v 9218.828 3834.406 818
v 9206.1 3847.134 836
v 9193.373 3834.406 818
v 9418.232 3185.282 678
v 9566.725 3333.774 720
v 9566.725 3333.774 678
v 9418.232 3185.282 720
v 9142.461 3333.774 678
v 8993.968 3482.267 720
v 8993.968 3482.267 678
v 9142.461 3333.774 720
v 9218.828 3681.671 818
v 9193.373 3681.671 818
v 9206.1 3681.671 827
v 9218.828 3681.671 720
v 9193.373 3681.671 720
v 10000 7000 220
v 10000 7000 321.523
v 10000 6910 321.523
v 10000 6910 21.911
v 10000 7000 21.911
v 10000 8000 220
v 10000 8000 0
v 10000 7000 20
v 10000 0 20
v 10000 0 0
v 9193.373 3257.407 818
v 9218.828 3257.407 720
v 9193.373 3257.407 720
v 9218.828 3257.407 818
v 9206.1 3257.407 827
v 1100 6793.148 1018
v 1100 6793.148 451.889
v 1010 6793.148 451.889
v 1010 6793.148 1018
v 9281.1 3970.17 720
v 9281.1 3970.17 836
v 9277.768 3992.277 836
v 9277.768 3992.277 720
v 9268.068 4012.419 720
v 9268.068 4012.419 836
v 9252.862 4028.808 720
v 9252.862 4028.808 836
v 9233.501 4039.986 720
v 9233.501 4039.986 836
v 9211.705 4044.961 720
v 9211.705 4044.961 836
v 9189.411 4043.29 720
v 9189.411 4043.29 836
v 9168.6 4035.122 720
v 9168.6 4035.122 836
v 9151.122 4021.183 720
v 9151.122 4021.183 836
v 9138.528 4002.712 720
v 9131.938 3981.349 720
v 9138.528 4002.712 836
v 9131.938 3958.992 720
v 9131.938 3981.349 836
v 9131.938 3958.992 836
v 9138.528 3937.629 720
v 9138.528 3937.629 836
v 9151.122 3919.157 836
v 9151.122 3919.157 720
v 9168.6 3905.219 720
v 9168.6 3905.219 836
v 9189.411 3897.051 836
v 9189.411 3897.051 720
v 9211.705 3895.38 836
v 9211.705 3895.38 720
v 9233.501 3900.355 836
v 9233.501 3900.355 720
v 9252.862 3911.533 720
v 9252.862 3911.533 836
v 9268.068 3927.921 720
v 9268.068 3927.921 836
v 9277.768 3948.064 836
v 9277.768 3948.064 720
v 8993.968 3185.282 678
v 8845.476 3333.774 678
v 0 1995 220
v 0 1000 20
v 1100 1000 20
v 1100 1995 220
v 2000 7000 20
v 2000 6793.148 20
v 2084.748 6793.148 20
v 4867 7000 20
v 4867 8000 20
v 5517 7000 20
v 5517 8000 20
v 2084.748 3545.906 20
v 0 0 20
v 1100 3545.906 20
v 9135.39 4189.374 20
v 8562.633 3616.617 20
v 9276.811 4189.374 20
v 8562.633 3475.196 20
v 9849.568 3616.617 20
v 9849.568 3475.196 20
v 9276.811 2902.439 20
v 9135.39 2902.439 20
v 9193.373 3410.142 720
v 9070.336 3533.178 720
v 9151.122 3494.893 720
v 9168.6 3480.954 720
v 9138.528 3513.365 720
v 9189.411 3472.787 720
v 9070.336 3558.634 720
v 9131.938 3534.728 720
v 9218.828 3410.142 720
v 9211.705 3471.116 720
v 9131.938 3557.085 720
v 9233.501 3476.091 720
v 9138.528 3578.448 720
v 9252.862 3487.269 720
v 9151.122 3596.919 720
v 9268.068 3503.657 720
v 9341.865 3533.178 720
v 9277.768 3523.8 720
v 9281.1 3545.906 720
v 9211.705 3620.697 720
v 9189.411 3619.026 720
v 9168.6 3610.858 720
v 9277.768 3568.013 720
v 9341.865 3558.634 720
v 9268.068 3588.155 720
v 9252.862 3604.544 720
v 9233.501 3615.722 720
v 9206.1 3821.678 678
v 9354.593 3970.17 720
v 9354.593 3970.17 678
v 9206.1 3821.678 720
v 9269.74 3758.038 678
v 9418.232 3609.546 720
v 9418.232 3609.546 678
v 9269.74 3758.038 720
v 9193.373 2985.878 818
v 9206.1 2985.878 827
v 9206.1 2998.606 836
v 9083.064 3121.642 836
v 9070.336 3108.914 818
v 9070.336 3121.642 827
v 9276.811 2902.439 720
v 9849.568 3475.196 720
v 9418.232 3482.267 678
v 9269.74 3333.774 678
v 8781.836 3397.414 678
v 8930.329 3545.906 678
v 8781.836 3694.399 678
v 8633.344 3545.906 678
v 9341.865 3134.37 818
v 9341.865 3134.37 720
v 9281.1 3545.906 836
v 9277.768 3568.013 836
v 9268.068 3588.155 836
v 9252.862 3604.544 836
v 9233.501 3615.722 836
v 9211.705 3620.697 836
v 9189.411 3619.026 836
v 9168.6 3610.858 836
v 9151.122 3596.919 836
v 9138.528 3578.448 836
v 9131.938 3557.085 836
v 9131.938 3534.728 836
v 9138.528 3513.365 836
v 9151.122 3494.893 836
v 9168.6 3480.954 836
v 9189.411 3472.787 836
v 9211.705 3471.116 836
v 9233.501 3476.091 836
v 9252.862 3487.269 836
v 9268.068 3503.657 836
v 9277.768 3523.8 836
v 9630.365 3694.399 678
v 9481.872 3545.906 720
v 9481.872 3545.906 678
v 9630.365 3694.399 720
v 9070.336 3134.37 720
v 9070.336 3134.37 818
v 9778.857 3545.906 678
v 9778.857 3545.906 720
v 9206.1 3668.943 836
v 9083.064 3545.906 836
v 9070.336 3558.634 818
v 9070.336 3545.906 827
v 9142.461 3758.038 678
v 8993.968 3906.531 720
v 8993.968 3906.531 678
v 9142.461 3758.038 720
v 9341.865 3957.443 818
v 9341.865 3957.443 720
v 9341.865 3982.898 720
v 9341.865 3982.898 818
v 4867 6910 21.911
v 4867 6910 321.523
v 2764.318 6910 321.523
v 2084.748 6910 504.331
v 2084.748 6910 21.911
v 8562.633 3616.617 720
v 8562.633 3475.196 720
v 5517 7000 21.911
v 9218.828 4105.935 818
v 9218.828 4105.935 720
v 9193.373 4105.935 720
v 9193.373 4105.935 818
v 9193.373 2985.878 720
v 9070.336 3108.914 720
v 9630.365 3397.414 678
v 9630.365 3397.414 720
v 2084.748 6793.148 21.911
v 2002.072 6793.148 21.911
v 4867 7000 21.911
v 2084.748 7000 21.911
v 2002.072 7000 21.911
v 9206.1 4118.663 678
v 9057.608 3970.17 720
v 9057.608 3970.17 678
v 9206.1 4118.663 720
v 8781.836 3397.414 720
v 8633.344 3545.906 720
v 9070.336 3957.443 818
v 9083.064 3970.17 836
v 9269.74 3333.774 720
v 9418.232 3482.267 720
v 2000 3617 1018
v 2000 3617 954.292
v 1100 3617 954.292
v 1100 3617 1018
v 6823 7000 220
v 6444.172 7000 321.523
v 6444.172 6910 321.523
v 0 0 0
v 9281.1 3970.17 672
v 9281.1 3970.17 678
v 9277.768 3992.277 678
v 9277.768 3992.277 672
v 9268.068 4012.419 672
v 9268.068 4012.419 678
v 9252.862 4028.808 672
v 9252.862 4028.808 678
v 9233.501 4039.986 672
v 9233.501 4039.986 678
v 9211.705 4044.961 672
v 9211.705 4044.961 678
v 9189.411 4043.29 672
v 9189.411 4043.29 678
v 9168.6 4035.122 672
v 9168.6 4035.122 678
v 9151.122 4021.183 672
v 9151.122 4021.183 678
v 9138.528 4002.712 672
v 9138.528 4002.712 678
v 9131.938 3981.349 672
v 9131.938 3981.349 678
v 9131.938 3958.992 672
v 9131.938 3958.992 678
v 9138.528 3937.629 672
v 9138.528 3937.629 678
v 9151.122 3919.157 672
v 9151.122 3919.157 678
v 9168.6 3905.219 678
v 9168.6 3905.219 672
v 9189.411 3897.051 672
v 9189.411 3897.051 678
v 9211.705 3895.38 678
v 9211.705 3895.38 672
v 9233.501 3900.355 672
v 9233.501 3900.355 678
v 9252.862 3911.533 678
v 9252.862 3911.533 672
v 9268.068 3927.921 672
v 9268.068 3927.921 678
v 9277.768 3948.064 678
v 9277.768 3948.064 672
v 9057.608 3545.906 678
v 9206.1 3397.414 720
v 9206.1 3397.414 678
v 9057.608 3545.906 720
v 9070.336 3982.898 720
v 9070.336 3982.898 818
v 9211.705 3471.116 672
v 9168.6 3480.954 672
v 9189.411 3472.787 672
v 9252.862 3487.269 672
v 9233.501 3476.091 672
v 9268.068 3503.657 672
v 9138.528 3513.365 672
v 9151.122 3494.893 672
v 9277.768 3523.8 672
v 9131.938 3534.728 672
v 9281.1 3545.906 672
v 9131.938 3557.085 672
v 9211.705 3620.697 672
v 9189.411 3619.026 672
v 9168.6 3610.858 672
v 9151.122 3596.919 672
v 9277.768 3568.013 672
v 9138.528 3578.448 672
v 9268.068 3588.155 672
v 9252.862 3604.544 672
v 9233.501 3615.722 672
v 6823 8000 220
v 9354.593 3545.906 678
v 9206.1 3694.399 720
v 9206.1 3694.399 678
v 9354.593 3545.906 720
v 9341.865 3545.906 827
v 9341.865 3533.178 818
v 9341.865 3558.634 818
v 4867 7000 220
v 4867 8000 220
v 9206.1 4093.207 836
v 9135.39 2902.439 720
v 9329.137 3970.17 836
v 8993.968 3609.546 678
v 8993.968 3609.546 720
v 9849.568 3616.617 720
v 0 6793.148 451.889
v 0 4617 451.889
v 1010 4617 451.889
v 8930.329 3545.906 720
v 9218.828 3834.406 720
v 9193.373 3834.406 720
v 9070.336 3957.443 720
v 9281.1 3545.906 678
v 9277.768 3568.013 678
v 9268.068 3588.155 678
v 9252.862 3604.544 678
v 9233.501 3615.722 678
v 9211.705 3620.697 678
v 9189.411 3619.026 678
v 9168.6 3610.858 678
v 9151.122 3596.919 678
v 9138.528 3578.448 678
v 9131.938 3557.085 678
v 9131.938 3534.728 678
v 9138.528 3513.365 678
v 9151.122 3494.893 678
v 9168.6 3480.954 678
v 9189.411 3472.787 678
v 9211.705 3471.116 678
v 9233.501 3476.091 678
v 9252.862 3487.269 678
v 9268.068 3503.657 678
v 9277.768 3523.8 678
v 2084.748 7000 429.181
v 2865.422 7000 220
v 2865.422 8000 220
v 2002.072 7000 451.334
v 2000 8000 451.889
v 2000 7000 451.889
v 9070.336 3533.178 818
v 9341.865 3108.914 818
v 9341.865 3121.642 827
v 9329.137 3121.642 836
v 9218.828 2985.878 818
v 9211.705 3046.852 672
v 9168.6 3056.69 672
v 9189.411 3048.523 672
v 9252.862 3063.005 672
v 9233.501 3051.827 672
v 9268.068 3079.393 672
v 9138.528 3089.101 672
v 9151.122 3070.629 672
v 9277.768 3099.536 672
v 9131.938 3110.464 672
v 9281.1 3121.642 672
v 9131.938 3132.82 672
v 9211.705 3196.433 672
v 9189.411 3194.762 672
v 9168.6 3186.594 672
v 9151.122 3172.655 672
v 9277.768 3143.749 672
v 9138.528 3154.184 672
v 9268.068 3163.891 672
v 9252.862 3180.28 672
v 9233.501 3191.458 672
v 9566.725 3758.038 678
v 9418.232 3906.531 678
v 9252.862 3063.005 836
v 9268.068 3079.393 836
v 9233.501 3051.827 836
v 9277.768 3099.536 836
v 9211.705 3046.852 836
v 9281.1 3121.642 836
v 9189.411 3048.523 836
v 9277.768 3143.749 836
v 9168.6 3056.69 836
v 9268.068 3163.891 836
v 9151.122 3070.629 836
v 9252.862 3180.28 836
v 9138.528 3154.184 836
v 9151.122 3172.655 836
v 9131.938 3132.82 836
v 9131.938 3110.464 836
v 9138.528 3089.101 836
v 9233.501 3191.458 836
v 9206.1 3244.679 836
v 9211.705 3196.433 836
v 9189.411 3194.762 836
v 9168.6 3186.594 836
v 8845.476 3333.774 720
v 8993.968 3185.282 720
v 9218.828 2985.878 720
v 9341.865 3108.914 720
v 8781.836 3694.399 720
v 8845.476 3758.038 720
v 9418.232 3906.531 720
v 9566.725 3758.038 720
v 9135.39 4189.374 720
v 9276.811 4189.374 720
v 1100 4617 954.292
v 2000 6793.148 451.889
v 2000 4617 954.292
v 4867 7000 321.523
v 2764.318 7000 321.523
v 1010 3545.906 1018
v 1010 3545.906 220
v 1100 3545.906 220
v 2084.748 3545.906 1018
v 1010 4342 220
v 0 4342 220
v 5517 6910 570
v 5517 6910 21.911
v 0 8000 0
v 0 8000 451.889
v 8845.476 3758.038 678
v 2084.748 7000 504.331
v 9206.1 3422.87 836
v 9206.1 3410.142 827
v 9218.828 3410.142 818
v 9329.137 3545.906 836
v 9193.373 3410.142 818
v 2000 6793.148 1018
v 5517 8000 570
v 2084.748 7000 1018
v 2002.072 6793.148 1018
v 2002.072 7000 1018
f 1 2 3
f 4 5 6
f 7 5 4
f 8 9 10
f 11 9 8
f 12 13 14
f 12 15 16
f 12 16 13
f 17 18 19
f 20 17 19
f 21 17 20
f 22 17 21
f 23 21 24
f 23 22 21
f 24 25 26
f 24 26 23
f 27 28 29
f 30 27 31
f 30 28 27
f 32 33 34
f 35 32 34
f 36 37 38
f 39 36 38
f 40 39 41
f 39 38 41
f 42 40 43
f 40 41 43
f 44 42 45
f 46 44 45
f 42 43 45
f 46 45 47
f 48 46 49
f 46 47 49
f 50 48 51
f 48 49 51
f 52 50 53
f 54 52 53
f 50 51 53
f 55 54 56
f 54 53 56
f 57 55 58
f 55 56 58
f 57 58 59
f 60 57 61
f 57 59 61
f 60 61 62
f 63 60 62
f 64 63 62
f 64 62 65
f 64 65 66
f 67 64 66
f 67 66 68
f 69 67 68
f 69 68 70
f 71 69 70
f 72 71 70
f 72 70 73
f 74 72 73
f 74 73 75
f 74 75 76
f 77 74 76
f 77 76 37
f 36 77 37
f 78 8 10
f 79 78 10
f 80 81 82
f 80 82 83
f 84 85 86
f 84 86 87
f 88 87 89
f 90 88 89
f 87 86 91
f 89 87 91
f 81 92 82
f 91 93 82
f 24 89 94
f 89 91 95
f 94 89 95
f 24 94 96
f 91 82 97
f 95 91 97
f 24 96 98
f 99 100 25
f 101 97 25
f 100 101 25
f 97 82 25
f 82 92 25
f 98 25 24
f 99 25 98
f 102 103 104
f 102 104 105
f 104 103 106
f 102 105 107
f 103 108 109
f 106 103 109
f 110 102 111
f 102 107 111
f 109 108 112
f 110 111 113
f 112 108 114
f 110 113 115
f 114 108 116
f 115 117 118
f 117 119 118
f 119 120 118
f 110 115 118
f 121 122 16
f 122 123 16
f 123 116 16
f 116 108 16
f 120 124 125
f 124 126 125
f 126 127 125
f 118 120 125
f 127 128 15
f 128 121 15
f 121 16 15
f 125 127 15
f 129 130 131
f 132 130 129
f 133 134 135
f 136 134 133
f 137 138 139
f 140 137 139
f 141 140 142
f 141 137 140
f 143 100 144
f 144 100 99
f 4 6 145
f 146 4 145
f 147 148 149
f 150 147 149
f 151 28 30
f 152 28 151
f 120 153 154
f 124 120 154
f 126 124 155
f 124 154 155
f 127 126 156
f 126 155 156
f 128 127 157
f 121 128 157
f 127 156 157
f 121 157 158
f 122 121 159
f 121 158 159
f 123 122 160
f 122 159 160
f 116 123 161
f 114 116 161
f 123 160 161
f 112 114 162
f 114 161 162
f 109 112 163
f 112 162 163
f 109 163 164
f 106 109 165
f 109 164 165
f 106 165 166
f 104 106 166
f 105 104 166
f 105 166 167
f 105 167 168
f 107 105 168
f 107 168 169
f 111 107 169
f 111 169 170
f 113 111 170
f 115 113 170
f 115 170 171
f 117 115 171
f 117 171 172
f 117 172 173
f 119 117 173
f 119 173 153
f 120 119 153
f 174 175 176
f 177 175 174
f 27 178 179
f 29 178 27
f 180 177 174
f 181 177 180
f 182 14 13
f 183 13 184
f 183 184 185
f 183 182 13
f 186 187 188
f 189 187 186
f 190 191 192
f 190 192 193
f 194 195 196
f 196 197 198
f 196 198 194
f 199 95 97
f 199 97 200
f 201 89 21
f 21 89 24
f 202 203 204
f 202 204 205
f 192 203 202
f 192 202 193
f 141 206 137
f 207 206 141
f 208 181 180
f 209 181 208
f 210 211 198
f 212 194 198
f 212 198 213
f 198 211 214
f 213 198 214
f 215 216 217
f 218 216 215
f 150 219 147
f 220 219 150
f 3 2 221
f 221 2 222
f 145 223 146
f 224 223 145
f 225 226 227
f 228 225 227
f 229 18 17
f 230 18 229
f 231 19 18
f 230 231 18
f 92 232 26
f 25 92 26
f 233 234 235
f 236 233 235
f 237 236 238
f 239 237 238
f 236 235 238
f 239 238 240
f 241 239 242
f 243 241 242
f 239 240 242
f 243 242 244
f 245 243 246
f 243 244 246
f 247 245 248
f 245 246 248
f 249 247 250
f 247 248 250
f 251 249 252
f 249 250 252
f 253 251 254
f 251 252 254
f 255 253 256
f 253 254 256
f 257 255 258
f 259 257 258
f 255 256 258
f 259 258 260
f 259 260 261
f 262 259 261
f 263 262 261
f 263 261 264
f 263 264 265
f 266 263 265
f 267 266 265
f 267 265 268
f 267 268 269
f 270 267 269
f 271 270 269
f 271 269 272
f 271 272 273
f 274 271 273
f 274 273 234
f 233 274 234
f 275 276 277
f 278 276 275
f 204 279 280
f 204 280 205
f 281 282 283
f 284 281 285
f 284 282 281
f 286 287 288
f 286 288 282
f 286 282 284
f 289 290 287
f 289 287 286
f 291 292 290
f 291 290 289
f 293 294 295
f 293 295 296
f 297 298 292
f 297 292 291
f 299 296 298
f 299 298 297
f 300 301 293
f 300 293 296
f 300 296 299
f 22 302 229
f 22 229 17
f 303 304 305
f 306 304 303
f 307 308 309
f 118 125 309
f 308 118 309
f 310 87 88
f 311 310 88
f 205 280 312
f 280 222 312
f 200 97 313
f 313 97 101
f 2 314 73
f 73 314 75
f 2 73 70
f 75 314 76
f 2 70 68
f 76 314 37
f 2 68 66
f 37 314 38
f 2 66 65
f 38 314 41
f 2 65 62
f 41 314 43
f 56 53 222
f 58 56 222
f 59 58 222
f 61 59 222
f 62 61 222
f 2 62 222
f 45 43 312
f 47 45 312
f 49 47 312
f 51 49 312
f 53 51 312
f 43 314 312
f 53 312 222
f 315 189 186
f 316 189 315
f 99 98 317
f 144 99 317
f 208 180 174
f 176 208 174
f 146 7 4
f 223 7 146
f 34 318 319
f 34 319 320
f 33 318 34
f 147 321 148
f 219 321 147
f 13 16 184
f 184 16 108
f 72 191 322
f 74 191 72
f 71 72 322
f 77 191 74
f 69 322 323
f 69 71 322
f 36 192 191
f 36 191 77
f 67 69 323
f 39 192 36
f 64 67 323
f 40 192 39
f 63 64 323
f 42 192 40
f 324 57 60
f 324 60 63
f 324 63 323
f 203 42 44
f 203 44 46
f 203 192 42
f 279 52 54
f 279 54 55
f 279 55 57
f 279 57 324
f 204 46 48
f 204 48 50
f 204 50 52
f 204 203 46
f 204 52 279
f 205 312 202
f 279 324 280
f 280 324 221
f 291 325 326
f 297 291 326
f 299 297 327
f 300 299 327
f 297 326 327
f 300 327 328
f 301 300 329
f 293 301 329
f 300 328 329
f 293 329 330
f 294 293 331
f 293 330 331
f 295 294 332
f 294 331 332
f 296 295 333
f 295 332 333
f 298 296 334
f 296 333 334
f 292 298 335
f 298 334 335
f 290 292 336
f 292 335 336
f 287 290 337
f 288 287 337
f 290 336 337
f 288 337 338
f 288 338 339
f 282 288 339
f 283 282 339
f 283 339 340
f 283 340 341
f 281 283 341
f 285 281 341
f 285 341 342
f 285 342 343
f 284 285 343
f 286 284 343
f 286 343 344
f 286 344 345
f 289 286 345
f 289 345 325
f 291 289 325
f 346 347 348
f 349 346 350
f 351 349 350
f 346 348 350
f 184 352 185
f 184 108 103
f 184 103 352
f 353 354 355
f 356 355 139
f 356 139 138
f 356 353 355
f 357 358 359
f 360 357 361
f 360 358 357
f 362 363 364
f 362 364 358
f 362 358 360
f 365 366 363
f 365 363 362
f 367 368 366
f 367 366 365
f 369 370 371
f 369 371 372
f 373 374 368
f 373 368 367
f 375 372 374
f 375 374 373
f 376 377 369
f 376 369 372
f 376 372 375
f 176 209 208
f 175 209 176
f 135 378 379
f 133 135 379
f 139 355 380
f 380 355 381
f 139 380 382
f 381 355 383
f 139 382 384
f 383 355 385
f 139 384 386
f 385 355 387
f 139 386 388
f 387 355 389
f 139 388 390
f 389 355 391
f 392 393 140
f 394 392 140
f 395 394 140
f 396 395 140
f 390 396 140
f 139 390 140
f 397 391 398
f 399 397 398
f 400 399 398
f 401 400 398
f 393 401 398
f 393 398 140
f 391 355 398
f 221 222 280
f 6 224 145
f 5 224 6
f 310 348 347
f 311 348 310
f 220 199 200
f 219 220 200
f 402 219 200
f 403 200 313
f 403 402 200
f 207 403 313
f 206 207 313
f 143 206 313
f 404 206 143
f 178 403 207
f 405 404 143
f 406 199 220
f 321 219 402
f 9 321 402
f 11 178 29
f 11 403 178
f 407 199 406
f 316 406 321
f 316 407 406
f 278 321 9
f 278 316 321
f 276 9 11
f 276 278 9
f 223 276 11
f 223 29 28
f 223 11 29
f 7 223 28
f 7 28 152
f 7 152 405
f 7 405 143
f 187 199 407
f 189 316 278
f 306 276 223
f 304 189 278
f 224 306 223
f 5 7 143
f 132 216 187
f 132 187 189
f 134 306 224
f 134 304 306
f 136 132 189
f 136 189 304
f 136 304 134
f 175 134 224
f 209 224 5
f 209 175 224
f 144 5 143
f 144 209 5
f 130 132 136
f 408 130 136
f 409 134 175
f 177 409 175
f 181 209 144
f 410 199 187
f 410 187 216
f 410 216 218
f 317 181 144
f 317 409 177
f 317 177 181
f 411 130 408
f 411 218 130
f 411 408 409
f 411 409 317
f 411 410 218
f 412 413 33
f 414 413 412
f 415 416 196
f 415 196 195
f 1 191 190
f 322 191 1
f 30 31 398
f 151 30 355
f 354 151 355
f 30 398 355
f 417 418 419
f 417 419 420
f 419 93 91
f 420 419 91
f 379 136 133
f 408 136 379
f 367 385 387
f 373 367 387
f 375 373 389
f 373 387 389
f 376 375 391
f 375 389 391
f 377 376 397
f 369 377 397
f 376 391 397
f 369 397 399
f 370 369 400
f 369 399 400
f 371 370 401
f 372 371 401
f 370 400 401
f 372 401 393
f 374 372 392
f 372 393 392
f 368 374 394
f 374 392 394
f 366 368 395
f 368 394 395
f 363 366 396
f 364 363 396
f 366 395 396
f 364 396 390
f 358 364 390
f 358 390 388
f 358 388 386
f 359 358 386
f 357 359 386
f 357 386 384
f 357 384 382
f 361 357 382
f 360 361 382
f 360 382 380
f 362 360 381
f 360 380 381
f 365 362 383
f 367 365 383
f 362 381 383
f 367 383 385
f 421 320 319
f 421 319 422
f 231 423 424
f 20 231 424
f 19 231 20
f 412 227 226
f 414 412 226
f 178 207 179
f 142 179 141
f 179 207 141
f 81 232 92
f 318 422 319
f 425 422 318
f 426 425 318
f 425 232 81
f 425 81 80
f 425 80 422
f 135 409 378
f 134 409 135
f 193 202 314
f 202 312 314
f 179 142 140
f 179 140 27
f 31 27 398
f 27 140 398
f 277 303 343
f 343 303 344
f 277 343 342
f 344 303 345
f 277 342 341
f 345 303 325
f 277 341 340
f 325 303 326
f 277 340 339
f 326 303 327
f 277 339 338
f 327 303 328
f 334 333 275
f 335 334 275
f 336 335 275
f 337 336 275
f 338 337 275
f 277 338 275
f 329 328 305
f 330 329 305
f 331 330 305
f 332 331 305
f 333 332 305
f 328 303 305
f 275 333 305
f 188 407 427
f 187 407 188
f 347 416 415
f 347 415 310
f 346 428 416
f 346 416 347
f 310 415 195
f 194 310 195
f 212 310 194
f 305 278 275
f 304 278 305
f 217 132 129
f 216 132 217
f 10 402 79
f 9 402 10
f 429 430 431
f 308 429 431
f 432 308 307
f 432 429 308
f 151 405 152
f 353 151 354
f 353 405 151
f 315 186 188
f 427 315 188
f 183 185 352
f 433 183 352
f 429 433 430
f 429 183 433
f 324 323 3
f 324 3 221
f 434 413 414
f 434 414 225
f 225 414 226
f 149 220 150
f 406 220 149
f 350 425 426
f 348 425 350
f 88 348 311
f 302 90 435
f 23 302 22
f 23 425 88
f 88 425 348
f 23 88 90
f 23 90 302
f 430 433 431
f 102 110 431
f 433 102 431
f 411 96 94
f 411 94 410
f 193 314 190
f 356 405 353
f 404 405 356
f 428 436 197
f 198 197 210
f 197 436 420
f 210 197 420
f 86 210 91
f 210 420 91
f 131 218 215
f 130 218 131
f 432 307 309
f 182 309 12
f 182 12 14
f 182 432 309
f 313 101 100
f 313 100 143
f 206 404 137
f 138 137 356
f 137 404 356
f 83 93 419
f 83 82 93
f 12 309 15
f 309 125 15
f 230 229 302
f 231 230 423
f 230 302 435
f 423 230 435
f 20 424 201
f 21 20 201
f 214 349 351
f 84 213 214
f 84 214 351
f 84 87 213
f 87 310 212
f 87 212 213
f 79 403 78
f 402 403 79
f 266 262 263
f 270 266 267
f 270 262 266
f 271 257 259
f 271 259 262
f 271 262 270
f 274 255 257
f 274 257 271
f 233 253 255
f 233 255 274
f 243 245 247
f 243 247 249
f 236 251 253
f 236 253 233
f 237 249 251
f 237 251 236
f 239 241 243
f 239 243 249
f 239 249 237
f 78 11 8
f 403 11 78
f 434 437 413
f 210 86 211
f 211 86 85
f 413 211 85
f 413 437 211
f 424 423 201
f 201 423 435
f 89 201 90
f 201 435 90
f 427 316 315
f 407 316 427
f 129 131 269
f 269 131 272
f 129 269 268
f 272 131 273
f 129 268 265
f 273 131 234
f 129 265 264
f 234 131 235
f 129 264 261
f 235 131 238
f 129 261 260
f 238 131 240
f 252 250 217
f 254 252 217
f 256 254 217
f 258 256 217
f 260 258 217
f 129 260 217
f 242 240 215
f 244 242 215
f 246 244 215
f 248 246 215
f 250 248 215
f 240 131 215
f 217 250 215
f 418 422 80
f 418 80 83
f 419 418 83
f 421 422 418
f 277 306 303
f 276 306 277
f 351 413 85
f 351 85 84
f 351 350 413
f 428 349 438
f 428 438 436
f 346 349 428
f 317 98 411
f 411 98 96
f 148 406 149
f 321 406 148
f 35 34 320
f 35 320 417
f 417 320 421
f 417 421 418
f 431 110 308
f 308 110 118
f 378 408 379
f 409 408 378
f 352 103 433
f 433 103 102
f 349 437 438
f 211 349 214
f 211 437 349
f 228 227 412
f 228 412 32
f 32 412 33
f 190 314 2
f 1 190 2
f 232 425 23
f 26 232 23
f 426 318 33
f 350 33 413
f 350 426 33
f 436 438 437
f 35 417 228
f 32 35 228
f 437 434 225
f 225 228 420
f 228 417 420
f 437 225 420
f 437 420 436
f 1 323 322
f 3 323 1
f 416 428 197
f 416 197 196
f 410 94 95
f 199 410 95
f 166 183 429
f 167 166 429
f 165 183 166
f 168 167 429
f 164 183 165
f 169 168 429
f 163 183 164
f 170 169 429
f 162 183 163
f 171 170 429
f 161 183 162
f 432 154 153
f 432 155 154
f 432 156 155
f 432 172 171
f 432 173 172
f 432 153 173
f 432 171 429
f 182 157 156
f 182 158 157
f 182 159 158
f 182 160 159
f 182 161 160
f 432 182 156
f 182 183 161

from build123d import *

# Parameters (mm, degrees)
SKETCH_1_W                  = 10000
SKETCH_1_H                  = 8000
EXTRUDE_1_DEPTH             = 20
SKETCH_2_W                  = 4483
SKETCH_2_H                  = 1000
EXTRUDE_2_DEPTH             = 200
EXTRUDE_3_DEPTH             = 1000
SKETCH_5_W                  = 2867
SKETCH_5_H                  = 1000
EXTRUDE_4_DEPTH             = 200
EXTRUDE_5_DEPTH             = 1000
SKETCH_7_W                  = 2000
SKETCH_7_H                  = 3383
EXTRUDE_6_DEPTH             = 431.88915
EXTRUDE_7_DEPTH             = 2000
SKETCH_10_W                 = 1100
SKETCH_10_H                 = 934.292466456
CUT_EXTRUDE_1_DEPTH         = 2176.14786
EXTRUDE_START               = -4e-06
SKETCH_11_W                 = 1100
SKETCH_11_H                 = 431.889147349
EXTRUDE_8_DEPTH             = 2176.14786
SKETCH_12_W                 = 900
SKETCH_12_H                 = 1000
EXTRUDE_9_DEPTH             = 934.292466
EXTRUDE_10_DEPTH            = 1100
SKETCH_16_W                 = 1100
SKETCH_16_H                 = 200
EXTRUDE_11_DEPTH            = 2622
EXTRUDE_12_DEPTH            = 1100
EXTRUDE_13_DEPTH            = 1018
SKETCH_22_W                 = 82.675943171
SKETCH_22_H                 = 996.089113944
EXTRUDE_14_DEPTH            = 206.852144
SKETCH_23_W                 = 1000
SKETCH_23_H                 = 90
EXTRUDE_15_DEPTH            = 2782.251832
CUT_EXTRUDE_2_DEPTH         = 308
SKETCH_25_W                 = 296.558009181
SKETCH_25_H                 = 236.726130136
CUT_EXTRUDE_3_DEPTH         = 3067
EXTRUDE_START_2             = -4483
SKETCH_26_W                 = 299.612595247
SKETCH_26_H                 = 90
EXTRUDE_16_DEPTH            = 4483
EXTRUDE_17_DEPTH            = 90
EXTRUDE_18_DEPTH            = 700
CHAMFER_1_SIZE              = 100
CUT_EXTRUDE_5_DEPTH         = 42
PATTERN_LINEAR_2_COUNT      = 3
PATTERN_LINEAR_2_PITCH      = 300
PATTERN_LINEAR_2_COUNT_DIR2 = 3
PATTERN_LINEAR_2_PITCH_DIR2 = 300
EXTRUDE_19_DEPTH            = 158
CHAMFER_4_SIZE              = 18
CHAMFER_5_SIZE              = 18
EXTRUDE_20_DEPTH            = 116
CHAMFER_6_SIZE              = 18
CHAMFER_7_SIZE              = 18
EXTRUDE_21_DEPTH            = 116
CHAMFER_8_SIZE              = 18
SKETCH_41_R                 = 75
CUT_EXTRUDE_6_DEPTH         = 164
SKETCH_42_R                 = 75
CUT_EXTRUDE_7_DEPTH         = 164
SKETCH_43_R                 = 75
CUT_EXTRUDE_8_DEPTH         = 164


with BuildPart() as part:
    # 草图1 → 凸台-拉伸1 (new body)
    with BuildSketch(Plane.XY):
        with Locations((5000, 4000)):
            Rectangle(SKETCH_1_W, SKETCH_1_H)
    extrude(amount=EXTRUDE_1_DEPTH)

    # 草图2 → 凸台-拉伸2 (add)
    with BuildSketch(Plane.XY.offset(20)):
        with Locations((7758.5, 7500)):
            Rectangle(SKETCH_2_W, SKETCH_2_H)
    extrude(amount=EXTRUDE_2_DEPTH)

    # 草图3 → 凸台-拉伸3 (add)
    with BuildSketch(Plane(origin=(0, 8000, 0), x_dir=(1, 0, 0), z_dir=(0, 1, 0))):
        Polygon((5517, -220), (5517, -570), (6823, -220), align=None)
    extrude(amount=-EXTRUDE_3_DEPTH)

    # 草图5 → 凸台-拉伸4 (add)
    with BuildSketch(Plane.XY.offset(20)):
        with Locations((3433.5, 7500)):
            Rectangle(SKETCH_5_W, SKETCH_5_H)
    extrude(amount=EXTRUDE_4_DEPTH)

    # 草图6 → 凸台-拉伸5 (add)
    with BuildSketch(Plane(origin=(0, 8000, 0), x_dir=(1, 0, 0), z_dir=(0, 1, 0))):
        Polygon((2000, -220), (2865.42207963, -220), (2000, -451.889147349), align=None)
    extrude(amount=-EXTRUDE_5_DEPTH)

    # 草图7 → 凸台-拉伸6 (add)
    with BuildSketch(Plane.XY.offset(20)):
        with Locations((1000, 6308.5)):
            Rectangle(SKETCH_7_W, SKETCH_7_H)
    extrude(amount=EXTRUDE_6_DEPTH)

    # 草图9 → 凸台-拉伸7 (add)
    with BuildSketch(Plane(origin=(2000, 0, 0), x_dir=(0, 0, -1), z_dir=(1, 0, 0))):
        Polygon((-451.889147349, 4617), (-451.889147349, 6793.147855873), (-954.292466456, 4617), align=None)
    extrude(amount=-EXTRUDE_7_DEPTH)

    # 草图10 → 切除-拉伸1 (cut)
    with BuildSketch(Plane.XZ.offset(-4617)):
        with Locations((550, 487.146233228)):
            Rectangle(SKETCH_10_W, SKETCH_10_H)
    extrude(amount=-CUT_EXTRUDE_1_DEPTH, mode=Mode.SUBTRACT)

    # 草图11 → 凸台-拉伸8 (add)
    with BuildSketch(Plane.XZ.offset(-6793.147855873).offset(EXTRUDE_START)):
        with Locations((550, 235.944573675)):
            Rectangle(SKETCH_11_W, SKETCH_11_H)
    extrude(amount=EXTRUDE_8_DEPTH)

    # 草图12 → 凸台-拉伸9 (add)
    with BuildSketch(Plane.XY.offset(20)):
        with Locations((1550, 4117)):
            Rectangle(SKETCH_12_W, SKETCH_12_H)
    extrude(amount=EXTRUDE_9_DEPTH)

    # 草图14 → 凸台-拉伸10 (add)
    with BuildSketch(Plane.ZY.offset(-1100)):
        Polygon((220, 4342), (220, 4617), (451.889147349, 4617), align=None)
    extrude(amount=EXTRUDE_10_DEPTH)

    # 草图16 → 凸台-拉伸11 (add)
    with BuildSketch(Plane.XZ.offset(-4617)):
        with Locations((550, 120)):
            Rectangle(SKETCH_16_W, SKETCH_16_H)
    extrude(amount=EXTRUDE_11_DEPTH)

    # 草图17 → 凸台-拉伸12 (add)
    with BuildSketch(Plane.ZY):
        Polygon((20, 1995), (20, 1000), (220, 1995), align=None)
    extrude(amount=-EXTRUDE_12_DEPTH)

    # 草图18 → 凸台-拉伸13 (add)
    with BuildSketch(Plane.XY):
        Polygon((1100, 6793.147855873), (1010, 6793.147855873), (1010, 3545.906358022), (2084.748167595, 3545.906358022), (2084.748167595, 6793.147855873), (2000, 6793.147855873), (2000, 3617), (1100, 3617), align=None)
    extrude(amount=EXTRUDE_13_DEPTH)

    # 草图22 → 凸台-拉伸14 (add)
    with BuildSketch(Plane(origin=(0, 6793.147855873, 0), x_dir=(1, 0, 0), z_dir=(0, 1, 0))):
        with Locations((2043.41019601, -519.955443028)):
            Rectangle(SKETCH_22_W, SKETCH_22_H)
    extrude(amount=EXTRUDE_14_DEPTH)

    # 草图23 → 凸台-拉伸15 (add)
    with BuildSketch(Plane(origin=(2084.748167595, 0, 0), x_dir=(0, 0, -1), z_dir=(1, 0, 0))):
        with Locations((-521.910886056, 6955)):
            Rectangle(SKETCH_23_W, SKETCH_23_H)
    extrude(amount=EXTRUDE_15_DEPTH)

    # 草图24 → 切除-拉伸2 (cut)
    with BuildSketch(Plane(origin=(0, 7000, 0), x_dir=(1, 0, 0), z_dir=(0, 1, 0))):
        Polygon((2084.748167595, -1018), (2084.748167595, -504.330547982), (2764.317775175, -321.523481303), (4867, -321.523481303), (4867, -1021.910886056), align=None)
    extrude(amount=-CUT_EXTRUDE_2_DEPTH, mode=Mode.SUBTRACT)


with BuildPart() as cut_extrude_2_piece_1:
    # of the separate pieces the step leaves, piece 1, a body of its own (cut_extrude_2_pieces)
    add(part.part.solids().sort_by_distance((0, 0, 0))[0])

    # 草图26 → 凸台-拉伸16 (add)
    with BuildSketch(Plane(origin=(10000, 0, 0), x_dir=(0, 0, -1), z_dir=(1, 0, 0)).offset(EXTRUDE_START_2)):
        with Locations((-171.71718368, 6955)):
            Rectangle(SKETCH_26_W, SKETCH_26_H)
    extrude(amount=EXTRUDE_16_DEPTH)

    # 草图27 → 凸台-拉伸17 (add)
    with BuildSketch(Plane.XZ.offset(-7000)):
        Polygon((5517, 570), (5517, 321.523481303), (6444.172381196, 321.523481303), align=None)
    extrude(amount=EXTRUDE_17_DEPTH)

    # 草图32 → 凸台-拉伸18 (add)
    with BuildSketch(Plane.XY.offset(20)):
        Polygon((9920.278281584, 3545.906358022), (9206.100432586, 4260.084207021), (8491.922583587, 3545.906358022), (9206.100432586, 2831.728509024), align=None)
    extrude(amount=EXTRUDE_18_DEPTH)

    # 倒角1
    chamfer_1_edges = [cut_extrude_2_piece_1.edges().sort_by_distance(p)[0] for p in [
        (9206.100432586, 2831.728509024, 370),
        (9920.278281584, 3545.906358022, 370),
        (9206.100432586, 4260.084207021, 370),
        (8491.922583587, 3545.906358022, 370),
    ]]
    chamfer(chamfer_1_edges, length=CHAMFER_1_SIZE)

    # 草图35 → 切除-拉伸5 (cut)
    with BuildSketch(Plane.XY.offset(720)):
        Polygon((8633.343939825, 3545.906358022), (8781.836363874, 3694.398782071), (8930.328787923, 3545.906358022), (8781.836363874, 3397.413933973), align=None)
    cut_extrude_5 = extrude(amount=-CUT_EXTRUDE_5_DEPTH, mode=Mode.SUBTRACT)

    # 阵列(线性)2: Cut-Extrude 5 3 × 3
    with Locations(*[Vector(0.7071067811865527, -0.7071067811865424, 0) * (i * PATTERN_LINEAR_2_PITCH) + Vector(0.7071067811865408, 0.7071067811865542, 0) * (j * PATTERN_LINEAR_2_PITCH_DIR2) for i in range(PATTERN_LINEAR_2_COUNT) for j in range(PATTERN_LINEAR_2_COUNT_DIR2) if (i, j) != (0, 0)]):
        add(cut_extrude_5, mode=Mode.SUBTRACT)

    # 草图36 → 凸台-拉伸19 (add)
    with BuildSketch(Plane.XY.offset(678)):
        Polygon((9057.608008537, 3121.64228931), (9206.100432586, 3270.134713359), (9354.592856635, 3121.64228931), (9206.100432586, 2973.149865261), align=None)
    extrude(amount=EXTRUDE_19_DEPTH)

    # 倒角4
    chamfer_4_edges = [cut_extrude_2_piece_1.edges().sort_by_distance(p)[0] for p in [
        (9131.854220561, 3047.396077286, 836),
        (9280.34664461, 3047.396077286, 836),
        (9280.34664461, 3195.888501335, 836),
        (9131.854220561, 3195.888501335, 836),
    ]]
    chamfer(chamfer_4_edges, length=CHAMFER_4_SIZE)

    # 倒角5
    chamfer_5_edges = [cut_extrude_2_piece_1.edges().sort_by_distance(p)[0] for p in [
        (9057.608008537, 3121.64228931, 769),
        (9206.100432586, 3270.134713359, 769),
        (9354.592856635, 3121.64228931, 769),
        (9206.100432586, 2973.149865261, 769),
    ]]
    chamfer(chamfer_5_edges, length=CHAMFER_5_SIZE)


with BuildPart() as cut_extrude_2_piece_2:
    # of the separate pieces the step leaves, piece 2, a body of its own (cut_extrude_2_pieces)
    add(part.part.solids().sort_by_distance((2084.748167595, 6910, 1021.910886056))[0])

    # 草图25 → 切除-拉伸3 (cut)
    with BuildSketch(Plane(origin=(2084.748167595, 0, 0), x_dir=(0, 0, -1), z_dir=(1, 0, 0))):
        with Locations((-1038.303536701, 6926.915216344)):
            Rectangle(SKETCH_25_W, SKETCH_25_H)
    extrude(amount=CUT_EXTRUDE_3_DEPTH, mode=Mode.SUBTRACT)


with BuildPart() as body_2:
    # 草图37 → 凸台-拉伸20 (new body)
    with BuildSketch(Plane.XY.offset(720)):
        Polygon((9057.608008537, 3545.906358022), (9206.100432586, 3397.413933973), (9354.592856635, 3545.906358022), (9206.100432586, 3694.398782071), align=None)
    extrude(amount=EXTRUDE_20_DEPTH)

    # 倒角6
    chamfer_6_edges = [body_2.edges().sort_by_distance(p)[0] for p in [
        (9280.34664461, 3471.660145998, 836),
        (9280.34664461, 3620.152570047, 836),
        (9131.854220561, 3620.152570047, 836),
        (9131.854220561, 3471.660145998, 836),
    ]]
    chamfer(chamfer_6_edges, length=CHAMFER_6_SIZE)

    # 倒角7
    chamfer_7_edges = [body_2.edges().sort_by_distance(p)[0] for p in [
        (9206.100432586, 3694.398782071, 769),
        (9354.592856635, 3545.906358022, 769),
        (9057.608008537, 3545.906358022, 769),
        (9206.100432586, 3397.413933973, 769),
    ]]
    chamfer(chamfer_7_edges, length=CHAMFER_7_SIZE)


with BuildPart() as body_3:
    # 草图38 → 凸台-拉伸21 (new body)
    with BuildSketch(Plane.XY.offset(720)):
        Polygon((9057.608008537, 3970.170426734), (9206.100432586, 4118.662850783), (9354.592856635, 3970.170426734), (9206.100432586, 3821.678002685), align=None)
    extrude(amount=EXTRUDE_21_DEPTH)

    # 倒角8
    chamfer_8_edges = [body_3.edges().sort_by_distance(p)[0] for p in [
        (9280.34664461, 4044.416638759, 836),
        (9131.854220561, 4044.416638759, 836),
        (9131.854220561, 3895.92421471, 836),
        (9280.34664461, 3895.92421471, 836),
        (9057.608008537, 3970.170426734, 778),
        (9206.100432586, 4118.662850783, 778),
        (9354.592856635, 3970.170426734, 778),
        (9206.100432586, 3821.678002685, 778),
    ]]
    chamfer(chamfer_8_edges, length=CHAMFER_8_SIZE)


with BuildPart() as cut_extrude_6_tool:
    # 草图41 → 切除-拉伸6 (new body)
    with BuildSketch(Plane.XY.offset(836)):
        with Locations((9206.100432586, 3970.170426734)):
            Circle(SKETCH_41_R)
    extrude(amount=-CUT_EXTRUDE_6_DEPTH)


with BuildPart() as cut_extrude_2_piece_1_1:
    add(cut_extrude_2_piece_1.part)

    # 切除-拉伸6: cut by cut_extrude_6_tool
    add(cut_extrude_6_tool.part, mode=Mode.SUBTRACT)


with BuildPart() as body_3_1:
    add(body_3.part)

    # 切除-拉伸6: cut by cut_extrude_6_tool
    add(cut_extrude_6_tool.part, mode=Mode.SUBTRACT)


with BuildPart() as cut_extrude_7_tool:
    # 草图42 → 切除-拉伸7 (new body)
    with BuildSketch(Plane.XY.offset(836)):
        with Locations((9206.100432586, 3545.906358022)):
            Circle(SKETCH_42_R)
    extrude(amount=-CUT_EXTRUDE_7_DEPTH)


with BuildPart() as cut_extrude_2_piece_1_2:
    add(cut_extrude_2_piece_1_1.part)

    # 切除-拉伸7: cut by cut_extrude_7_tool
    add(cut_extrude_7_tool.part, mode=Mode.SUBTRACT)

    # 草图43 → 切除-拉伸8 (cut)
    with BuildSketch(Plane.XY.offset(836)):
        with Locations((9206.100432586, 3121.64228931)):
            Circle(SKETCH_43_R)
    extrude(amount=-CUT_EXTRUDE_8_DEPTH, mode=Mode.SUBTRACT)


with BuildPart() as body_2_1:
    add(body_2.part)

    # 切除-拉伸7: cut by cut_extrude_7_tool
    add(cut_extrude_7_tool.part, mode=Mode.SUBTRACT)


solid = Compound([body_3_1.part, cut_extrude_2_piece_1_2.part, body_2_1.part])
